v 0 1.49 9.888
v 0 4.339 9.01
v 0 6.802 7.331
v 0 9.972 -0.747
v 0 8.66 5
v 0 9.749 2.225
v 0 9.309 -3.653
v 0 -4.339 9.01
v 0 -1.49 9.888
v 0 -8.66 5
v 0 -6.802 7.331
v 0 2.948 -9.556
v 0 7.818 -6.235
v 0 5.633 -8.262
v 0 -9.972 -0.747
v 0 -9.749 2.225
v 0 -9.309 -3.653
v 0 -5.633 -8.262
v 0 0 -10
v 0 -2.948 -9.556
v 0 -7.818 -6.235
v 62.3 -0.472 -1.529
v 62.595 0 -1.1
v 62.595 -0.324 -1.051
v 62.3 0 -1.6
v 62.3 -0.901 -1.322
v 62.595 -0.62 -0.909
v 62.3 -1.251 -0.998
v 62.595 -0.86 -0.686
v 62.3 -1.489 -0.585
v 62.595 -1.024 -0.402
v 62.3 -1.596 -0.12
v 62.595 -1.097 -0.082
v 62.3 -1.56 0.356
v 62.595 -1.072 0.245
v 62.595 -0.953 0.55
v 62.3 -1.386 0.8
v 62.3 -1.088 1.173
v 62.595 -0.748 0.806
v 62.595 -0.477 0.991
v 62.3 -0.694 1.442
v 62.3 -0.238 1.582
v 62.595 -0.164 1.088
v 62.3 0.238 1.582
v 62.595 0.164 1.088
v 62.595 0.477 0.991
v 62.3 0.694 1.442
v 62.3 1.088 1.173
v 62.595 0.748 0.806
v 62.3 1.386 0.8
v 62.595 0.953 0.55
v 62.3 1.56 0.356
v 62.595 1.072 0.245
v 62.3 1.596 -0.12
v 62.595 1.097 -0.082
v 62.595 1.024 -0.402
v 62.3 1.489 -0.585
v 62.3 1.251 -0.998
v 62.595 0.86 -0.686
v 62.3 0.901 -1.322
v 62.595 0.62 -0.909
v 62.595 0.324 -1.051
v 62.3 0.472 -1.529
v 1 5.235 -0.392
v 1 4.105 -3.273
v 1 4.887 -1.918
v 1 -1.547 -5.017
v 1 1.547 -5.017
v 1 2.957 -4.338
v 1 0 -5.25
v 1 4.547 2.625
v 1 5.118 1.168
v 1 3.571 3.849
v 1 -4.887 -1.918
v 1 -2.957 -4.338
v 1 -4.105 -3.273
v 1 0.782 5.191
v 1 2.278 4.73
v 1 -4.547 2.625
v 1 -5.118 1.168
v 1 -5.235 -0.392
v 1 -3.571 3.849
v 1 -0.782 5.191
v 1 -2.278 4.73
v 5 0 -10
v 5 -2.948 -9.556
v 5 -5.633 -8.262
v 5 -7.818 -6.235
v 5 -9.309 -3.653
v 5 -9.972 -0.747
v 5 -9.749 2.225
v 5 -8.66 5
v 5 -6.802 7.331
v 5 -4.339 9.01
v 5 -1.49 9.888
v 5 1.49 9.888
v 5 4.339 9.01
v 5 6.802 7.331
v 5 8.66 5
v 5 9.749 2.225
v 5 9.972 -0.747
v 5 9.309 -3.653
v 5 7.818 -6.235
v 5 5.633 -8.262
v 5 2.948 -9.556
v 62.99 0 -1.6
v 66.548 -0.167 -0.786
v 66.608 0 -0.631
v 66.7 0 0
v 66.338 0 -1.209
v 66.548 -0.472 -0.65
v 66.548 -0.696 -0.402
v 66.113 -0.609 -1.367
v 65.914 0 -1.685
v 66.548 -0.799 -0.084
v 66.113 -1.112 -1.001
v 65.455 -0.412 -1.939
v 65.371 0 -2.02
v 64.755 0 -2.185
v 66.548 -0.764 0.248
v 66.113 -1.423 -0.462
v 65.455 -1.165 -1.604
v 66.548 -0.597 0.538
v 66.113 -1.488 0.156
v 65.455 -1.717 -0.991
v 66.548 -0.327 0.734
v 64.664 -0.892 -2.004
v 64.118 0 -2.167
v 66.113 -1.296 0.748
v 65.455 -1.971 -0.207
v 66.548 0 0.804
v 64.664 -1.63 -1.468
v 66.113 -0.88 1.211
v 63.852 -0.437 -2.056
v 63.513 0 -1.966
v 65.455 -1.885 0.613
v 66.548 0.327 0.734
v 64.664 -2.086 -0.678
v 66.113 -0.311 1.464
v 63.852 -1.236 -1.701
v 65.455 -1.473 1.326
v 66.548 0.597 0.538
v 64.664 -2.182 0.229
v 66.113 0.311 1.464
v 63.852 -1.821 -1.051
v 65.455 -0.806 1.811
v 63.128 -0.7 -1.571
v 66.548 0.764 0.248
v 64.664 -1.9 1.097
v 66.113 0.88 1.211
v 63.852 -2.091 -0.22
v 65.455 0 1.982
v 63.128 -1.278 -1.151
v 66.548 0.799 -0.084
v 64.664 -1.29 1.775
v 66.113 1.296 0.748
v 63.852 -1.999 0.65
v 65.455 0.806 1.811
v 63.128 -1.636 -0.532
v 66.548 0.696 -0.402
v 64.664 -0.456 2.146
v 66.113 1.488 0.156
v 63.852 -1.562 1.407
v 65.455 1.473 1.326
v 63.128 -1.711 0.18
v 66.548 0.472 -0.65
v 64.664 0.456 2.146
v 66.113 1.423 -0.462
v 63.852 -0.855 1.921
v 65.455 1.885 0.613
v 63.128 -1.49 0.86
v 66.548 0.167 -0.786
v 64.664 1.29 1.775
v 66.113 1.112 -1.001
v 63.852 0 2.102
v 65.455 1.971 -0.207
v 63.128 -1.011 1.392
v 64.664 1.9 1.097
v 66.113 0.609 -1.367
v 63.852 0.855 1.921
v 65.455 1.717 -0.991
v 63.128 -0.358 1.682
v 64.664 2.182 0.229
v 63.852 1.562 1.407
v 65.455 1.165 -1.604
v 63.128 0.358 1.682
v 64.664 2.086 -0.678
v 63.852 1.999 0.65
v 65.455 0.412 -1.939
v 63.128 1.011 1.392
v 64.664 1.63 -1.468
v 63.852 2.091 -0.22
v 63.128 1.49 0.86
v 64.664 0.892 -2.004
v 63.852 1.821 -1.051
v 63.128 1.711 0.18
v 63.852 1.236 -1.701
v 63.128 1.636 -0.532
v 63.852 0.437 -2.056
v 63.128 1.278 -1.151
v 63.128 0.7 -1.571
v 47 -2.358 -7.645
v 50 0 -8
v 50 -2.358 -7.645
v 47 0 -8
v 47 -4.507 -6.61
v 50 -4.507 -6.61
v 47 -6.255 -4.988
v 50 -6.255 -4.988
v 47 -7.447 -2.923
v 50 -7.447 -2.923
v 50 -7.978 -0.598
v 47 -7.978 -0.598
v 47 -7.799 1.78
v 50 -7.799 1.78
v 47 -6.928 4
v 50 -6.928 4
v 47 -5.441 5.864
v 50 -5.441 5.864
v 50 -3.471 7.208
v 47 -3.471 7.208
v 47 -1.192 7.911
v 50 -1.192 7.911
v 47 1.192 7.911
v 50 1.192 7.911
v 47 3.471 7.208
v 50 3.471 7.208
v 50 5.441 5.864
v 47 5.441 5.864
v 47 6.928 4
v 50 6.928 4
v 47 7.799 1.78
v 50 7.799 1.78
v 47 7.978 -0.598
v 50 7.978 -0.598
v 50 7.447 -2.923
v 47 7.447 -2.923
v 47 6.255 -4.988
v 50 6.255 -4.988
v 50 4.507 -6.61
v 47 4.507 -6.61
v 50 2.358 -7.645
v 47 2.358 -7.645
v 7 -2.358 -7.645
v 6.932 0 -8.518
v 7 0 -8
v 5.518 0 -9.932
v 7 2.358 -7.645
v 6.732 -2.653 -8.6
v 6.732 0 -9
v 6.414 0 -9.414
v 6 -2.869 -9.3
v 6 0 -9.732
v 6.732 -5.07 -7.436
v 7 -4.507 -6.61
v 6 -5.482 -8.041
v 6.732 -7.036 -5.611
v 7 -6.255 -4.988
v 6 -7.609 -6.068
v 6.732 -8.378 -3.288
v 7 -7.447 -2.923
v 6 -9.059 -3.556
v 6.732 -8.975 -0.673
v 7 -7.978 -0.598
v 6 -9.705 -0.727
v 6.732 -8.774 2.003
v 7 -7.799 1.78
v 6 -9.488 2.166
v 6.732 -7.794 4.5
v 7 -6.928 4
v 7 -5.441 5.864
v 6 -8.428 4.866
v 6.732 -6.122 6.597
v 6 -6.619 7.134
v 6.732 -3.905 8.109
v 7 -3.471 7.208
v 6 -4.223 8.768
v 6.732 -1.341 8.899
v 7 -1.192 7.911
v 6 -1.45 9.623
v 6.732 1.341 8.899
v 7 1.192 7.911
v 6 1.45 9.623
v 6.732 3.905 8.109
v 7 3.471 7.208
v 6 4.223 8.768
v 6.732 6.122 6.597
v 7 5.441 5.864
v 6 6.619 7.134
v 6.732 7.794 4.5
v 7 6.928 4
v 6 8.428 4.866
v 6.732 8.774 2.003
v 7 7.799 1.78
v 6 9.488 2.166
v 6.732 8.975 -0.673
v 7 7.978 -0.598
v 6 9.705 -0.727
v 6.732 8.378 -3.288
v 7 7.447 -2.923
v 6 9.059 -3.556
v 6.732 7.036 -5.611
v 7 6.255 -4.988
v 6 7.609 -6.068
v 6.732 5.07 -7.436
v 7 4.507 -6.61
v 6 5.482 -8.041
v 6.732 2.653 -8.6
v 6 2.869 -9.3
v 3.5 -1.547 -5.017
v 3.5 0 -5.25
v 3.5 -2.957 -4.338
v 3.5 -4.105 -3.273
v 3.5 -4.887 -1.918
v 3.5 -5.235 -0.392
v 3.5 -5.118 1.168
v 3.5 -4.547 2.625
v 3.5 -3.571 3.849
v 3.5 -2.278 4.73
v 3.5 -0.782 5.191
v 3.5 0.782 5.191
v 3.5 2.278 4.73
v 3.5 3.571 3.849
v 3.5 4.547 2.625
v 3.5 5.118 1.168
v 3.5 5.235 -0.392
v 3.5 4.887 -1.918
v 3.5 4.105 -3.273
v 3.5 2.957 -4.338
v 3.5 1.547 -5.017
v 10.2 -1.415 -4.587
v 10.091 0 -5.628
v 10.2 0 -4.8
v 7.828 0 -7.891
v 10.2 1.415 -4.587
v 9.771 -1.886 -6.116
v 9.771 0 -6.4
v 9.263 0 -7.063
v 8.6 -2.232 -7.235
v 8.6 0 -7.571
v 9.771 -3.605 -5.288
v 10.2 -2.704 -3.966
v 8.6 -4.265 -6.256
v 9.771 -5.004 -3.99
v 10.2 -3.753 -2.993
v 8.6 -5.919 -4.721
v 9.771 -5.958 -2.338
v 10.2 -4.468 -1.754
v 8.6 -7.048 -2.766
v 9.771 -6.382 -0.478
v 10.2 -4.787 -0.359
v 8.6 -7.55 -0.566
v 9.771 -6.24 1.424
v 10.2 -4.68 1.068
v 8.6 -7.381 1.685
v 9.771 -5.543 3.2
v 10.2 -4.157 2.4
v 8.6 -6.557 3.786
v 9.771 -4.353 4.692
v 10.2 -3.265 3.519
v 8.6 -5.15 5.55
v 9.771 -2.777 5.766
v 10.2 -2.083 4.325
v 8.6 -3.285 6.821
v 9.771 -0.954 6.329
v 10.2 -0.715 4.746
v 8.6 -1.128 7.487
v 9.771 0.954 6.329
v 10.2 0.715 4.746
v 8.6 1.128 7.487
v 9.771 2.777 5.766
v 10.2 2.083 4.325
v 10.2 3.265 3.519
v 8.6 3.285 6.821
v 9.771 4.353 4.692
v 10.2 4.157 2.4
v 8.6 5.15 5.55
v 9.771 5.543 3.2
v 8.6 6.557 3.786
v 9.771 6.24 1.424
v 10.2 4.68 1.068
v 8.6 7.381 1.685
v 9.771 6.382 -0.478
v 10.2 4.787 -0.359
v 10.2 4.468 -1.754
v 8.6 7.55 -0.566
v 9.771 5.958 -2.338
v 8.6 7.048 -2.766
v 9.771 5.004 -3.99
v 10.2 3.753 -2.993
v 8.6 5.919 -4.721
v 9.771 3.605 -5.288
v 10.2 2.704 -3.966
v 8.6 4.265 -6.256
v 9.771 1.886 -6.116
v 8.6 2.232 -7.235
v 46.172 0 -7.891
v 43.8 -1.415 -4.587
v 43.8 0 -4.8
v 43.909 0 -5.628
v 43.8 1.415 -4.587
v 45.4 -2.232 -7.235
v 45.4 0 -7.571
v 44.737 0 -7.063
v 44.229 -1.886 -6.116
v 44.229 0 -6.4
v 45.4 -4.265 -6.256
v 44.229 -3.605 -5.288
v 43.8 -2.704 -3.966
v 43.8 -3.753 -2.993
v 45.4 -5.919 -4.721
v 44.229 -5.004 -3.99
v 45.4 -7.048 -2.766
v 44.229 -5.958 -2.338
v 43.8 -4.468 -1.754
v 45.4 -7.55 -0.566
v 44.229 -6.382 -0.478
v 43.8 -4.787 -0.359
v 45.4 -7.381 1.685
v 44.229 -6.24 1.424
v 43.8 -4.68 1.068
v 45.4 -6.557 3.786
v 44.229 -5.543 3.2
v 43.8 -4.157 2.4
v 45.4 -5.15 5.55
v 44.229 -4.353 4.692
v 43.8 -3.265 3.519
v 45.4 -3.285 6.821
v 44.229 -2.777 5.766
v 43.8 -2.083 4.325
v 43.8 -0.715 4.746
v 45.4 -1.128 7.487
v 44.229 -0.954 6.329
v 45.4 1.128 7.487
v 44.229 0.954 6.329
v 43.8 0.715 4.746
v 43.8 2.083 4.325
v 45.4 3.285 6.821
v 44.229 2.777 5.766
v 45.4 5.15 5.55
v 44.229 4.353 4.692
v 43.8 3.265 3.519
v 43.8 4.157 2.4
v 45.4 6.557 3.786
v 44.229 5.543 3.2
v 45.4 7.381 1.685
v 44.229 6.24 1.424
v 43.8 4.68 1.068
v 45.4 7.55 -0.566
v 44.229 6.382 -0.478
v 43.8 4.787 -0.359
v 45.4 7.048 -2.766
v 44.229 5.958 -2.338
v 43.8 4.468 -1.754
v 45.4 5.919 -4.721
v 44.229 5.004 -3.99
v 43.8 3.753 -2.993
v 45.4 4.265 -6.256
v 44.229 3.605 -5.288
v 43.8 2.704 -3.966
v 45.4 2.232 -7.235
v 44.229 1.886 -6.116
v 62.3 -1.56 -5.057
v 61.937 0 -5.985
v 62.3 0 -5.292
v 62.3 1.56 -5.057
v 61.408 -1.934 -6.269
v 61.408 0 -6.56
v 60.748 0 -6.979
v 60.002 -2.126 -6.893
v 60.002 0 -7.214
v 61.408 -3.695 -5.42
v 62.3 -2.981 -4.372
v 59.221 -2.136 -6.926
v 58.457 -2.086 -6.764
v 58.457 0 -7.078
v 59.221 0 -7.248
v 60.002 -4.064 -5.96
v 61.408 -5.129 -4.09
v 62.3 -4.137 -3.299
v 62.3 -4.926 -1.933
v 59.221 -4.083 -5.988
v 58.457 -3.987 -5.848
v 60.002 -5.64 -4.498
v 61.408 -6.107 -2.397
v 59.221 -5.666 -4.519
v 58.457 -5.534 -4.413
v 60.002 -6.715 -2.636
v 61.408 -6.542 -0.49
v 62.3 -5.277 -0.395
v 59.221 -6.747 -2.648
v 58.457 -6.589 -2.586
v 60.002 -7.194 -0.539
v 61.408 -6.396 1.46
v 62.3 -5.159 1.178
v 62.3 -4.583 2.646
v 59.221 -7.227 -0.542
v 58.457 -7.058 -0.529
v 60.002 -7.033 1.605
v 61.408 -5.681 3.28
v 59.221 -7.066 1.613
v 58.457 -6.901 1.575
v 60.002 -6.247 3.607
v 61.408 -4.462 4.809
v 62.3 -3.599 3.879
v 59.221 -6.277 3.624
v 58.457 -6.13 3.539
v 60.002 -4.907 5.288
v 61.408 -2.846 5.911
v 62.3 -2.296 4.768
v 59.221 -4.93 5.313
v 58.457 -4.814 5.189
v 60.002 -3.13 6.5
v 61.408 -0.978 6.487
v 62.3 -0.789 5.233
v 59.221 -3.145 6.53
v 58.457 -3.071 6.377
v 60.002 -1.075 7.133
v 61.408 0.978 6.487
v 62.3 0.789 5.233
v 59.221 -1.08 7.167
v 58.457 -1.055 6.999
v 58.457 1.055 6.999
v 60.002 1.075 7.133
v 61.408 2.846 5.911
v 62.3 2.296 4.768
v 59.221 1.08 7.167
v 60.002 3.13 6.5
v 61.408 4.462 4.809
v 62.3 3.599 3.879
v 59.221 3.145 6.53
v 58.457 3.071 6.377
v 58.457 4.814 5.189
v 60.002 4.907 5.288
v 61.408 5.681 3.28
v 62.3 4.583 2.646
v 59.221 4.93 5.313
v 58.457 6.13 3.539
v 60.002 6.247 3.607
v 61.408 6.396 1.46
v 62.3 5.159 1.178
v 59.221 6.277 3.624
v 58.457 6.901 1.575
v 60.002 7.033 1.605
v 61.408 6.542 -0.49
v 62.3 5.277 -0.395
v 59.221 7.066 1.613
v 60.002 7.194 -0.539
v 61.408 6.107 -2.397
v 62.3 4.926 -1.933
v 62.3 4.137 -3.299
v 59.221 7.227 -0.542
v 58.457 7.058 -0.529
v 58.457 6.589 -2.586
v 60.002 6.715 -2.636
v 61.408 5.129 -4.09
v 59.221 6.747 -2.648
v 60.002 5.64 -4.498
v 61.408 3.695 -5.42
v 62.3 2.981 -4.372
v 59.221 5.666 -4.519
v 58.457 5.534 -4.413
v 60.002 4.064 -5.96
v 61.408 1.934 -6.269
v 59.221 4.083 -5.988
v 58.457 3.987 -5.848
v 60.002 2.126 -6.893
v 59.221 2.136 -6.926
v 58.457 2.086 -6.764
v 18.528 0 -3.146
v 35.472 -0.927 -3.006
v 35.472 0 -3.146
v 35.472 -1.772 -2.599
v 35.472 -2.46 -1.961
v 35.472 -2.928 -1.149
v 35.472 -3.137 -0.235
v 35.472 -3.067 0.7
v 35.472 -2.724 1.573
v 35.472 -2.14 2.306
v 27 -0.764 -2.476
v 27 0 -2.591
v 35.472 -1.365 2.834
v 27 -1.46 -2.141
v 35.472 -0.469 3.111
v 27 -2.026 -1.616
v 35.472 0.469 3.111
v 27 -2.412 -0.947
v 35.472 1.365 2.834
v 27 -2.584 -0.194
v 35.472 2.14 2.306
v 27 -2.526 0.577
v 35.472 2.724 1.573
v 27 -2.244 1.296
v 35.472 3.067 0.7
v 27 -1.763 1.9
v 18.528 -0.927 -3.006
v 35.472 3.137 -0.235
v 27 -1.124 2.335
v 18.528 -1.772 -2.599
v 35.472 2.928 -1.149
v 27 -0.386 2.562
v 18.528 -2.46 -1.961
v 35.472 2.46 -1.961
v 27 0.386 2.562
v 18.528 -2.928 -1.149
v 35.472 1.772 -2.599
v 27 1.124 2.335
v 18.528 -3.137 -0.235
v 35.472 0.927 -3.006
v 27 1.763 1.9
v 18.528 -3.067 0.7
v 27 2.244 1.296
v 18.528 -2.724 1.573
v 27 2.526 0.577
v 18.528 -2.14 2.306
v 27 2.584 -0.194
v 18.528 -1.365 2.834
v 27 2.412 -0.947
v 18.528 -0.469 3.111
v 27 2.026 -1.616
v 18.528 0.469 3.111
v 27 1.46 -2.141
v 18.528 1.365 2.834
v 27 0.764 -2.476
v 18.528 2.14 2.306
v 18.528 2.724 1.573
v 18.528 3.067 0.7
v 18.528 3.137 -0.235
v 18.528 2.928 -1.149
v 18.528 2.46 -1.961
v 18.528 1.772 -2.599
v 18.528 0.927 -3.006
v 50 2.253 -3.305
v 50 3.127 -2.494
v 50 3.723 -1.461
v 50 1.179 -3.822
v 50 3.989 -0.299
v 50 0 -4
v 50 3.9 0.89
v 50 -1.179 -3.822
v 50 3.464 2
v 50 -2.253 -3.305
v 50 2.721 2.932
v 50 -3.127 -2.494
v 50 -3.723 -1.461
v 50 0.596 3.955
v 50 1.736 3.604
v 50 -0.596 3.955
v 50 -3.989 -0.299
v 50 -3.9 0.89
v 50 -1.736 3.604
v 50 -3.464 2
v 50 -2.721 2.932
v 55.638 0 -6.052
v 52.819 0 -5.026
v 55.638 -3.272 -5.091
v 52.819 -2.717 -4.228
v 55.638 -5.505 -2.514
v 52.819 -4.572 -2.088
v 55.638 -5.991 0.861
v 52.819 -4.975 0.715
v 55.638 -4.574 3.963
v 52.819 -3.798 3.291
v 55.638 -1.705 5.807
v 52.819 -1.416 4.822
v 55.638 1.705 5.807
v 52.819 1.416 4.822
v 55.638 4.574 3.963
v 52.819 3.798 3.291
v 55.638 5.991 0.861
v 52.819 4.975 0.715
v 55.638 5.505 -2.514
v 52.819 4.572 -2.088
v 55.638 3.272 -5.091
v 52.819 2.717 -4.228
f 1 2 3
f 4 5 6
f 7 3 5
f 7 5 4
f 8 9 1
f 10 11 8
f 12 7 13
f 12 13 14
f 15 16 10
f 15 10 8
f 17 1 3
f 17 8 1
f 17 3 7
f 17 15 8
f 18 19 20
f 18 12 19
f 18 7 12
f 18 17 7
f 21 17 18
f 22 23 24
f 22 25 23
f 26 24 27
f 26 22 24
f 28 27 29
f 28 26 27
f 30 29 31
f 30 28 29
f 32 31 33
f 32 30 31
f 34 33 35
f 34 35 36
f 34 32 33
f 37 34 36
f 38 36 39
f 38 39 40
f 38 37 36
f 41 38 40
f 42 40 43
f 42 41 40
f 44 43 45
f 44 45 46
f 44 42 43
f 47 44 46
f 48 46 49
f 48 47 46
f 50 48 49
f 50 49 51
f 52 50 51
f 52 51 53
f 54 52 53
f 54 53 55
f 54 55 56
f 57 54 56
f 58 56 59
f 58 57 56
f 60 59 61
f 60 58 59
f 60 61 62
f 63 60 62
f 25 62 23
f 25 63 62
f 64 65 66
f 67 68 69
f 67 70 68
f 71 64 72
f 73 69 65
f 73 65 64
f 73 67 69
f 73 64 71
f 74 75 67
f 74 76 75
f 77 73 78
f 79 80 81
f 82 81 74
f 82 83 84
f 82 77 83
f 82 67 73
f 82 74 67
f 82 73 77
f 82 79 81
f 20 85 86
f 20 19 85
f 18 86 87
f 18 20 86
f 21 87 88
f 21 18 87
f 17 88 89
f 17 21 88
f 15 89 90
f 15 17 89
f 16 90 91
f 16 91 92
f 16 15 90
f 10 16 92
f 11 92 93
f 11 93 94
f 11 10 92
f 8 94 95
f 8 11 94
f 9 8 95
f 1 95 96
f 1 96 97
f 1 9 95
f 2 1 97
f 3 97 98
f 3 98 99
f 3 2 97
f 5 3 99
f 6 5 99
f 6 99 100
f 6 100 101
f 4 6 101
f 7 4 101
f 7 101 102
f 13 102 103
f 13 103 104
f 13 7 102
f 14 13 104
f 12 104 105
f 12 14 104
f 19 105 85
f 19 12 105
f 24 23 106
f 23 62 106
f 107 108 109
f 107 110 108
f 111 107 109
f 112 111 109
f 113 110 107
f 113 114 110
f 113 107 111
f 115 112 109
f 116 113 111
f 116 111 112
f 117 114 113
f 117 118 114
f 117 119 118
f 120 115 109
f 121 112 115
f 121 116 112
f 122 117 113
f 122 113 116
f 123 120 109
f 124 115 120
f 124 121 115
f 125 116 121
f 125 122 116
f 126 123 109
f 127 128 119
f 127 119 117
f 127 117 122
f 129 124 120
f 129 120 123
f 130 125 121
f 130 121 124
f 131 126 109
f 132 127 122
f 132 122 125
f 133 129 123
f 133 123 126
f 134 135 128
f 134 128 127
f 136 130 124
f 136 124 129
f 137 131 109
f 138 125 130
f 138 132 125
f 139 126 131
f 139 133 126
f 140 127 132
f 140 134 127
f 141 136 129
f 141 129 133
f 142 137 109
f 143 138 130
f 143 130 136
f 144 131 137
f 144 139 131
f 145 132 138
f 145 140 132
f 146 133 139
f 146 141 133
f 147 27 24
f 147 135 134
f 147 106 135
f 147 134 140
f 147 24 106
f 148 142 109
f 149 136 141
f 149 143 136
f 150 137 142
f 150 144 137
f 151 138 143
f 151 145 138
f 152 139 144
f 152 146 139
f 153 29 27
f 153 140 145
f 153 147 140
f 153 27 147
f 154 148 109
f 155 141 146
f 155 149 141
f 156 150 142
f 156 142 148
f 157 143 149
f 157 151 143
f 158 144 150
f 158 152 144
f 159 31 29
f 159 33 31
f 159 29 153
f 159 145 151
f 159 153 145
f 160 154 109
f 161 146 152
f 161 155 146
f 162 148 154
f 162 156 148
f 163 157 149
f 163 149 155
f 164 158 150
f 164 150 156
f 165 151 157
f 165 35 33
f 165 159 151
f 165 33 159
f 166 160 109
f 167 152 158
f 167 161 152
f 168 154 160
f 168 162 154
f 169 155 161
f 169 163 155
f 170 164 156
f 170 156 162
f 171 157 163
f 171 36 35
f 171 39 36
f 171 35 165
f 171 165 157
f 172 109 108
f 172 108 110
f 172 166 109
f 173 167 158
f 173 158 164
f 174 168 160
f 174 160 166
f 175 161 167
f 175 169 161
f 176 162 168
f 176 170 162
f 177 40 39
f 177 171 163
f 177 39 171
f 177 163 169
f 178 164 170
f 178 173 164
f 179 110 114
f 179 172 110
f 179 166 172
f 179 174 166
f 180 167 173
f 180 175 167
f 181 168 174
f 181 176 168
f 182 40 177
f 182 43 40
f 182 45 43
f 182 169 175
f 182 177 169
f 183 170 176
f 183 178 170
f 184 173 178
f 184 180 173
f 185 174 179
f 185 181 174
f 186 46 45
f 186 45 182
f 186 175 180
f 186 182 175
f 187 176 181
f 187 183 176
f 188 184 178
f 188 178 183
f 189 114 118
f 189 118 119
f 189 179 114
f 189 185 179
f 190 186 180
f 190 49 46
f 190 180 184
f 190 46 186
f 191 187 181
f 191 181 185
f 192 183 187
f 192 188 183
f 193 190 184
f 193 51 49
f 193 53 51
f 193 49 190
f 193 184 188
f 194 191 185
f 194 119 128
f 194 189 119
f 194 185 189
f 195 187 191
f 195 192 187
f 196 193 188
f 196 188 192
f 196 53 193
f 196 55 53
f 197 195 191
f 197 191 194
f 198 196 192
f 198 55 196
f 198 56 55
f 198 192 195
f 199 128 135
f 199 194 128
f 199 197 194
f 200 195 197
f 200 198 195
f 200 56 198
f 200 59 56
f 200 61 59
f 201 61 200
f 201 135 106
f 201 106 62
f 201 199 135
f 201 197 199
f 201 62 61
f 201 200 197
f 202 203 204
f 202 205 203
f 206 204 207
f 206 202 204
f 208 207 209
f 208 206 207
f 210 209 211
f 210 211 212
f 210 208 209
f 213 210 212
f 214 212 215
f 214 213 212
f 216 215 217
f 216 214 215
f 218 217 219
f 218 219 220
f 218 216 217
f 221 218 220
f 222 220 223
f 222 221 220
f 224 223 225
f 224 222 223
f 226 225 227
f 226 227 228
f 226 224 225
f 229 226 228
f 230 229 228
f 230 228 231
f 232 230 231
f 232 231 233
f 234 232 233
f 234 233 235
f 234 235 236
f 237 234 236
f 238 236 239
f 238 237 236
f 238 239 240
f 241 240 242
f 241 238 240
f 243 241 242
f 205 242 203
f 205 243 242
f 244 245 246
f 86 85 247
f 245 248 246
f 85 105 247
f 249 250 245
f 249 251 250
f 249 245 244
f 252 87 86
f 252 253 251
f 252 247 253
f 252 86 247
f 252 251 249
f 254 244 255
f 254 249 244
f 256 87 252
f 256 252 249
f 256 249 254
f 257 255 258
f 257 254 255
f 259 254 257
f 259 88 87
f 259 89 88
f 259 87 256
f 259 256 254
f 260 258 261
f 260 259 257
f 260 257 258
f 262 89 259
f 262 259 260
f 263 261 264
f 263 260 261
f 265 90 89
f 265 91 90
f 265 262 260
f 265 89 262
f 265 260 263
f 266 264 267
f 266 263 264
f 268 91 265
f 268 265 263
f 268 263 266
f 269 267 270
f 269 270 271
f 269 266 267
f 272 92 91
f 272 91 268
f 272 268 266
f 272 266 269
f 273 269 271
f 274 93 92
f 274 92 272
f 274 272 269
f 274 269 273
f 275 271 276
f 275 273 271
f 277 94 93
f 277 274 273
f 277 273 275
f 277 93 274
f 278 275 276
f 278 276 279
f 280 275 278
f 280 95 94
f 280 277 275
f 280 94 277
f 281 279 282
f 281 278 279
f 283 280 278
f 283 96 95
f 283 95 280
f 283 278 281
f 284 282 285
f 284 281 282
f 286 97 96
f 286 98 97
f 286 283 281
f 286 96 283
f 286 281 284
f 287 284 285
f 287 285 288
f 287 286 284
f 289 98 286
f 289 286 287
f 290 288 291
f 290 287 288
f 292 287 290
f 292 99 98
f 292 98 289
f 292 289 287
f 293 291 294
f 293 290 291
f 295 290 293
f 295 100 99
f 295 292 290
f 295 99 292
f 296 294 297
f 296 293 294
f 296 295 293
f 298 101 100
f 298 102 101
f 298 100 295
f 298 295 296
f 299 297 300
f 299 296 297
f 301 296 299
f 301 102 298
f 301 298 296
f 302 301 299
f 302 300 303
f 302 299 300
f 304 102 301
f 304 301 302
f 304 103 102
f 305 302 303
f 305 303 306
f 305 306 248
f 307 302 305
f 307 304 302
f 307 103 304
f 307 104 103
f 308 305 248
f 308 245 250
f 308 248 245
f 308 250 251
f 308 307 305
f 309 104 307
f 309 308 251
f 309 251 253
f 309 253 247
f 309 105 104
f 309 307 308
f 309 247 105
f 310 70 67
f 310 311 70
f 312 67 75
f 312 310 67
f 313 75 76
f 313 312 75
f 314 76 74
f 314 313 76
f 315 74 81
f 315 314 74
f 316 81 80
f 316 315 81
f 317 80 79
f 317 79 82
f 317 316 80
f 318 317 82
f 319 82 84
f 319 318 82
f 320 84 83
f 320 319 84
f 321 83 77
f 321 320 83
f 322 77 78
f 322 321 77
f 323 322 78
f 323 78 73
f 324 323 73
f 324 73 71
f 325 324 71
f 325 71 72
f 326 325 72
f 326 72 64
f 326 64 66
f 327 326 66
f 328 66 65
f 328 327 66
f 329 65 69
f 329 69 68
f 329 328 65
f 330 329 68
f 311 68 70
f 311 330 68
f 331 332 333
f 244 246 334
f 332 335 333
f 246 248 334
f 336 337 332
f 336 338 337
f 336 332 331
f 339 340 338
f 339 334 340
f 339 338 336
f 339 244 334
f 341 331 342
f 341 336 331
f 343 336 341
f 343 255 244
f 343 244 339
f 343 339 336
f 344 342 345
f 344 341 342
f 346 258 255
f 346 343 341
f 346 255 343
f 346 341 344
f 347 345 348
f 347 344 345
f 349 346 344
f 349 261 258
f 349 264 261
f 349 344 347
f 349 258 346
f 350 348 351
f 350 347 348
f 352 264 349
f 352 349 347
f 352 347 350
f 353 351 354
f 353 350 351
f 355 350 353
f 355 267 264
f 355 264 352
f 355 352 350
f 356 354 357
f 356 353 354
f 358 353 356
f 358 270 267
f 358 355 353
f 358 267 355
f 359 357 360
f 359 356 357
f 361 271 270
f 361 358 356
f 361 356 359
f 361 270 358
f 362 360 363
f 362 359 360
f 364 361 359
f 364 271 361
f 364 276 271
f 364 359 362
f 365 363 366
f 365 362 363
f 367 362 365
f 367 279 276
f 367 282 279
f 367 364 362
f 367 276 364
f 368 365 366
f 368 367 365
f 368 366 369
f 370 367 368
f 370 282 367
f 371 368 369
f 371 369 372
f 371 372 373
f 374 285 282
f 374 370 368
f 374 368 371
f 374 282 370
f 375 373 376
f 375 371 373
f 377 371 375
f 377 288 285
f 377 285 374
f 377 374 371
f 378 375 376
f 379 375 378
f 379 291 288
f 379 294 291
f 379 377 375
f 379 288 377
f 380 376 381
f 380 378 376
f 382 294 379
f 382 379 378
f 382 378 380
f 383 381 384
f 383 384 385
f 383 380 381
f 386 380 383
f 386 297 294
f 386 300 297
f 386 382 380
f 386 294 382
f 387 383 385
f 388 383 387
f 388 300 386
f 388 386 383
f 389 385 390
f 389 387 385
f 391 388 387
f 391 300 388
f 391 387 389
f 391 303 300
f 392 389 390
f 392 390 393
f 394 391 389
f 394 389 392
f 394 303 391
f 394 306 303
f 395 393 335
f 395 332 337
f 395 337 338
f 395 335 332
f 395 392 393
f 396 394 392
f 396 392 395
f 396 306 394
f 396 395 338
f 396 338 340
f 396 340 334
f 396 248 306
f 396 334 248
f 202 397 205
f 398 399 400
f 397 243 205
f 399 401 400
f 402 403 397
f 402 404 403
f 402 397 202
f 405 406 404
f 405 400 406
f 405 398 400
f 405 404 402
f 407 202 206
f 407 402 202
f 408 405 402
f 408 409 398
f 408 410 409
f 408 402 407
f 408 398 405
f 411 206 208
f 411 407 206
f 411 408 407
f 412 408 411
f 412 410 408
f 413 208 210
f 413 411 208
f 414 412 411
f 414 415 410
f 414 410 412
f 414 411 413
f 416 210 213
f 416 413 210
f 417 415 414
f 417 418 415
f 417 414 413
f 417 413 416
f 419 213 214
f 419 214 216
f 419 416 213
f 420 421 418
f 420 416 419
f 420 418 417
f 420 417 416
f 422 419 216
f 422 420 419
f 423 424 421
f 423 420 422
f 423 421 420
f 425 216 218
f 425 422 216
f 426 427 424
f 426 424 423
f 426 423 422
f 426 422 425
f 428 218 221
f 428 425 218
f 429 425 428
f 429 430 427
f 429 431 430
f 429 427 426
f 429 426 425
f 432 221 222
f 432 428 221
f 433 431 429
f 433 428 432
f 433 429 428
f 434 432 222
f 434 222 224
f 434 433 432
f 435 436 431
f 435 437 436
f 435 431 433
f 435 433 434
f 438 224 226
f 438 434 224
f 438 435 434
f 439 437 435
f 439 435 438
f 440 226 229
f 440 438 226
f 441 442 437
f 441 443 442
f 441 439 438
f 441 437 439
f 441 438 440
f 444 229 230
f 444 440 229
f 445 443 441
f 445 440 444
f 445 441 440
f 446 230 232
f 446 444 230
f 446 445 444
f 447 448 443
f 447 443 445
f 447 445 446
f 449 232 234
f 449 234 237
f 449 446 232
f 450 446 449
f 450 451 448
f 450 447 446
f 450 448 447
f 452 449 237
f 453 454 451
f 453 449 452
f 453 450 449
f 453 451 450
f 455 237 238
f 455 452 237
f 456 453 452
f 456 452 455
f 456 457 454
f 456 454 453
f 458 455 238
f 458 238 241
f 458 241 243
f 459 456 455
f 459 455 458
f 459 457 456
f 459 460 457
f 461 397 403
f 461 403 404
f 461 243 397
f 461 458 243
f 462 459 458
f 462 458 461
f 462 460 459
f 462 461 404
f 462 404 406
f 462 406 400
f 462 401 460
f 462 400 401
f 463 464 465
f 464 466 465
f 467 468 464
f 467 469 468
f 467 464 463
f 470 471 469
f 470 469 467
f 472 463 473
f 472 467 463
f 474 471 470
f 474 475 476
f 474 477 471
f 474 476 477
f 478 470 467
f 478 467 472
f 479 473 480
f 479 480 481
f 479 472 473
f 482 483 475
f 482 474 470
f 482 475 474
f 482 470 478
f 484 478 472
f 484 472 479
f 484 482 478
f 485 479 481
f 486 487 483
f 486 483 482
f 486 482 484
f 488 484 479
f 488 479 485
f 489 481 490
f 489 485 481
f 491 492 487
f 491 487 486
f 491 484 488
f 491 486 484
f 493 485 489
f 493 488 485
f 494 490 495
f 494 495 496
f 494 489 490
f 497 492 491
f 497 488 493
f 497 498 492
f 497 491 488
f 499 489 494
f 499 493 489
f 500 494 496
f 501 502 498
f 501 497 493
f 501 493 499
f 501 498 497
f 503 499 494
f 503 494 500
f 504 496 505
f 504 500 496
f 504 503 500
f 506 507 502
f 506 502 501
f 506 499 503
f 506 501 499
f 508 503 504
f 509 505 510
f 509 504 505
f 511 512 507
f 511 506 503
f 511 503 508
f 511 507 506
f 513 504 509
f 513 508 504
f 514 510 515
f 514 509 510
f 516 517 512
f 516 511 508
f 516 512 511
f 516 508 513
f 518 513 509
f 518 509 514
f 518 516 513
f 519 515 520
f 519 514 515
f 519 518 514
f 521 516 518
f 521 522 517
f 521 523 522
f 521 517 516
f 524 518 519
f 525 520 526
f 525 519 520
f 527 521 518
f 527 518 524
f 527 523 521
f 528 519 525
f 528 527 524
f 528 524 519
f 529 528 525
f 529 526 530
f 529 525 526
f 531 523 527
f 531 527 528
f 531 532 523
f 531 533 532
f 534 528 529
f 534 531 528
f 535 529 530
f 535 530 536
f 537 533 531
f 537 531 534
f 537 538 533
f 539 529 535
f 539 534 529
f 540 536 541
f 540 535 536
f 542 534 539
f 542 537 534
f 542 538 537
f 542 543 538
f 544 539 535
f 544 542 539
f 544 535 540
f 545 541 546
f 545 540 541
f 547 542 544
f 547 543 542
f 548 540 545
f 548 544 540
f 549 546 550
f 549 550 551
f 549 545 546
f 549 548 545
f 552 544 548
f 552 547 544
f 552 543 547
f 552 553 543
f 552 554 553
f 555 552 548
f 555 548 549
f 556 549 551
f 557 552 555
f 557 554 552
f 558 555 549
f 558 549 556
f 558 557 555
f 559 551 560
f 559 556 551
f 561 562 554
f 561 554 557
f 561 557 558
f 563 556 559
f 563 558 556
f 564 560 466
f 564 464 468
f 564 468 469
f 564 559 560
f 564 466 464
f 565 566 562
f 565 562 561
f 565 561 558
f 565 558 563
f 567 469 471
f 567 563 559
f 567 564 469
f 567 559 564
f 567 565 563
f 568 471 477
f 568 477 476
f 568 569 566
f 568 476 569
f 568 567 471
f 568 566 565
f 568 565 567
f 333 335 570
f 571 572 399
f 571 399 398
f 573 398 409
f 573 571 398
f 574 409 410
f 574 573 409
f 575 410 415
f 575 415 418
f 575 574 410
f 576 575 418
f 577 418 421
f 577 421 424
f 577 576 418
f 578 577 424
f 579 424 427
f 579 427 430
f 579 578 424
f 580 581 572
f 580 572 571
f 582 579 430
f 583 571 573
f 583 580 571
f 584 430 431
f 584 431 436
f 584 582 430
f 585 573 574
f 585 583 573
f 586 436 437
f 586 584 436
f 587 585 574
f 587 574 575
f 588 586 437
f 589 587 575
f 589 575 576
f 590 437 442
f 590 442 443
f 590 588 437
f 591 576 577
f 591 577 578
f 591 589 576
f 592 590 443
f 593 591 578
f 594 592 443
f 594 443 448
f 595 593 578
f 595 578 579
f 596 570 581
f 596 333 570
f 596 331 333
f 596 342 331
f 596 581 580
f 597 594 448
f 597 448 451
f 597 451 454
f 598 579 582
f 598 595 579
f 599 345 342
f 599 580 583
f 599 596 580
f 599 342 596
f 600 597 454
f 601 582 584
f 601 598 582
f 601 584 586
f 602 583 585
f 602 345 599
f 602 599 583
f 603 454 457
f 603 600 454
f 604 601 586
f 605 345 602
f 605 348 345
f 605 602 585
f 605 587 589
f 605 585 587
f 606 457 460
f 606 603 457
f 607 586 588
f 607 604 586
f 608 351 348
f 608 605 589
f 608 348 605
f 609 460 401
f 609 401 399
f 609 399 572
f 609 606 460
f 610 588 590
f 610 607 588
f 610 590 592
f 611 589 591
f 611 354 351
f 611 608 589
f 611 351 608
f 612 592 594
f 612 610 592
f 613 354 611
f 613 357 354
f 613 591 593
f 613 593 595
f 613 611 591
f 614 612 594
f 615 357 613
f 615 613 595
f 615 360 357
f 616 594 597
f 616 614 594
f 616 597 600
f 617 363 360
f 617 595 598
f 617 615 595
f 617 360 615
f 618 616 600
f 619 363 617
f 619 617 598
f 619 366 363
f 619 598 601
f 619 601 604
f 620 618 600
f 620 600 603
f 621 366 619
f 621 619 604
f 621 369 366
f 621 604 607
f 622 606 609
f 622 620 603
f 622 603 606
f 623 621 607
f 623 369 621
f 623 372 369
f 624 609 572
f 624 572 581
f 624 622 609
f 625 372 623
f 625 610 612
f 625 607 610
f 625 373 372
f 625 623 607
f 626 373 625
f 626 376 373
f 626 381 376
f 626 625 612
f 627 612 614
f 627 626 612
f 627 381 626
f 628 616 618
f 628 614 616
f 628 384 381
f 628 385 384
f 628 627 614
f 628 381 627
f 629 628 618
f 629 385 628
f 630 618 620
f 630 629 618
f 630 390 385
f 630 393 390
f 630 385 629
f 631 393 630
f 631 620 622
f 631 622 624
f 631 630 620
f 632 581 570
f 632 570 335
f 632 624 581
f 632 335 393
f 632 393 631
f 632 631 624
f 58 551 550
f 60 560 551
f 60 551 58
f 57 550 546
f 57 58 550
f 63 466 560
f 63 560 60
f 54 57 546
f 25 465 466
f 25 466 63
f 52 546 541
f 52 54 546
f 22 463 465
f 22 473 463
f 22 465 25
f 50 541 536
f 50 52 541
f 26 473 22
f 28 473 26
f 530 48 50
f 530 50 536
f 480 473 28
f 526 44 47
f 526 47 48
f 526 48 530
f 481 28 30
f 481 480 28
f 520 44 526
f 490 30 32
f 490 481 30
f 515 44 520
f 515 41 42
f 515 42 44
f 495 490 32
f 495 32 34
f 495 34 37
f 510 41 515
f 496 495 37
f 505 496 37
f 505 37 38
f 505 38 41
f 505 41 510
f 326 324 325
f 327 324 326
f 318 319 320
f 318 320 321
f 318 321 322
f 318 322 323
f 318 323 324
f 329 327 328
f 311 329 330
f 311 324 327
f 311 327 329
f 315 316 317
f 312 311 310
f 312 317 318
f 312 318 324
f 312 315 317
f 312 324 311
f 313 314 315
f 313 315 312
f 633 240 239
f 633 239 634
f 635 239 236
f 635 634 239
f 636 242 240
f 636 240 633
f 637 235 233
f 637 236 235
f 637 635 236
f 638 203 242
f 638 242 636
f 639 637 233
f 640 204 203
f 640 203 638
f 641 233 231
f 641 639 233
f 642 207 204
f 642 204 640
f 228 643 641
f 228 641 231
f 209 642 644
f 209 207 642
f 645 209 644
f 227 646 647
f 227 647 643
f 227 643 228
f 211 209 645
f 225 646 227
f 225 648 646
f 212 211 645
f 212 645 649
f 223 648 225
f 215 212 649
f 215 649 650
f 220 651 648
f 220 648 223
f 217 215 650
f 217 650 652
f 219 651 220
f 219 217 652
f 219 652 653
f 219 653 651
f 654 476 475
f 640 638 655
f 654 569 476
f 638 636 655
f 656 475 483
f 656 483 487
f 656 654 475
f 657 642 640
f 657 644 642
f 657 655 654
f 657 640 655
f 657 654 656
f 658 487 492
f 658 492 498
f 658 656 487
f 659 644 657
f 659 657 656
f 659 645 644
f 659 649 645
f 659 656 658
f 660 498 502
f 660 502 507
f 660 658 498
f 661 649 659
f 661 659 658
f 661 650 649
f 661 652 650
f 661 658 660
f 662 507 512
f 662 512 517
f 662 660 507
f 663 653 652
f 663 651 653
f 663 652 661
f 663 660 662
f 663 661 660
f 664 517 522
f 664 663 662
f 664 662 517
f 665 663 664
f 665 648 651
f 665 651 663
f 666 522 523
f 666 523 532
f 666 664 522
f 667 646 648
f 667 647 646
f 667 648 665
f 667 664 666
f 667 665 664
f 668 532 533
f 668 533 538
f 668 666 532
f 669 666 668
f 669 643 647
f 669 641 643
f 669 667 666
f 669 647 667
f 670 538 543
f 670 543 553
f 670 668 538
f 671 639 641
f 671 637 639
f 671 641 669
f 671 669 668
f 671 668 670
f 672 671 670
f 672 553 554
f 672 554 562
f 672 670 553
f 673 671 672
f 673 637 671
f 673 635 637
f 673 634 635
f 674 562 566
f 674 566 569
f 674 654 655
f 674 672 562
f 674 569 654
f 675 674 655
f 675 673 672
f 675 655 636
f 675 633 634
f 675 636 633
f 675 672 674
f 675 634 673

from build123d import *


with BuildPart() as part:
    # Sketch 153 → Повернуть1 (revolve)
    with BuildSketch(Plane(origin=(0, 0, 0), x_dir=(1, 0, 0), z_dir=(0, 1, 0))):
        Polygon((0, 10), (0, 0), (1, 0), (1, 5.25), (3.5, 5.25), (3.5, 0), (5, 0), (5, 10), align=None)
        with BuildLine():
            ThreePointArc((7, 8), (6.414213562, 9.414213562), (5, 10))
            Line((5, 10), (5, 0))
            Line((5, 0), (7, 0))
            Line((7, 0), (7, 8))
        make_face()
        with BuildLine():
            ThreePointArc((10.2, 4.8), (9.2627417, 7.0627417), (7, 8))
            Line((7, 8), (7, 0))
            Line((7, 0), (10.2, 0))
            Line((10.2, 0), (10.2, 4.8))
        make_face()
    revolve(axis=Axis((5, 0, 0), (-1, 0, 0)))

    # Sketch 880 → Повернуть2 (revolve)
    with BuildSketch(Plane(origin=(0, 0, 0), x_dir=(1, 0, 0), z_dir=(0, 1, 0))):
        with BuildLine():
            Line((10.2, 4.8), (10.2, 0))
            Line((10.2, 0), (66.7, 0))
            ThreePointArc((66.7, 0), (65.069401899, 2.125036818), (62.594744112, 1.1))
            Line((62.594744112, 1.1), (62.3, 1.6))
            Line((62.3, 1.6), (62.3, 5.291657255))
            ThreePointArc((62.3, 5.291657255), (60.748015293, 6.979485771), (58.457233587, 7.07818129))
            Line((58.457233587, 7.07818129), (50, 4))
            Line((50, 4), (50, 8))
            Line((50, 8), (47, 8))
            ThreePointArc((47, 8), (44.7372583, 7.0627417), (43.8, 4.8))
            ThreePointArc((43.8, 4.8), (27, 2.591400685), (10.2, 4.8))
        make_face()
    revolve(axis=Axis((50, 0, 0), (-1, 0, 0)))


solid = part.part
